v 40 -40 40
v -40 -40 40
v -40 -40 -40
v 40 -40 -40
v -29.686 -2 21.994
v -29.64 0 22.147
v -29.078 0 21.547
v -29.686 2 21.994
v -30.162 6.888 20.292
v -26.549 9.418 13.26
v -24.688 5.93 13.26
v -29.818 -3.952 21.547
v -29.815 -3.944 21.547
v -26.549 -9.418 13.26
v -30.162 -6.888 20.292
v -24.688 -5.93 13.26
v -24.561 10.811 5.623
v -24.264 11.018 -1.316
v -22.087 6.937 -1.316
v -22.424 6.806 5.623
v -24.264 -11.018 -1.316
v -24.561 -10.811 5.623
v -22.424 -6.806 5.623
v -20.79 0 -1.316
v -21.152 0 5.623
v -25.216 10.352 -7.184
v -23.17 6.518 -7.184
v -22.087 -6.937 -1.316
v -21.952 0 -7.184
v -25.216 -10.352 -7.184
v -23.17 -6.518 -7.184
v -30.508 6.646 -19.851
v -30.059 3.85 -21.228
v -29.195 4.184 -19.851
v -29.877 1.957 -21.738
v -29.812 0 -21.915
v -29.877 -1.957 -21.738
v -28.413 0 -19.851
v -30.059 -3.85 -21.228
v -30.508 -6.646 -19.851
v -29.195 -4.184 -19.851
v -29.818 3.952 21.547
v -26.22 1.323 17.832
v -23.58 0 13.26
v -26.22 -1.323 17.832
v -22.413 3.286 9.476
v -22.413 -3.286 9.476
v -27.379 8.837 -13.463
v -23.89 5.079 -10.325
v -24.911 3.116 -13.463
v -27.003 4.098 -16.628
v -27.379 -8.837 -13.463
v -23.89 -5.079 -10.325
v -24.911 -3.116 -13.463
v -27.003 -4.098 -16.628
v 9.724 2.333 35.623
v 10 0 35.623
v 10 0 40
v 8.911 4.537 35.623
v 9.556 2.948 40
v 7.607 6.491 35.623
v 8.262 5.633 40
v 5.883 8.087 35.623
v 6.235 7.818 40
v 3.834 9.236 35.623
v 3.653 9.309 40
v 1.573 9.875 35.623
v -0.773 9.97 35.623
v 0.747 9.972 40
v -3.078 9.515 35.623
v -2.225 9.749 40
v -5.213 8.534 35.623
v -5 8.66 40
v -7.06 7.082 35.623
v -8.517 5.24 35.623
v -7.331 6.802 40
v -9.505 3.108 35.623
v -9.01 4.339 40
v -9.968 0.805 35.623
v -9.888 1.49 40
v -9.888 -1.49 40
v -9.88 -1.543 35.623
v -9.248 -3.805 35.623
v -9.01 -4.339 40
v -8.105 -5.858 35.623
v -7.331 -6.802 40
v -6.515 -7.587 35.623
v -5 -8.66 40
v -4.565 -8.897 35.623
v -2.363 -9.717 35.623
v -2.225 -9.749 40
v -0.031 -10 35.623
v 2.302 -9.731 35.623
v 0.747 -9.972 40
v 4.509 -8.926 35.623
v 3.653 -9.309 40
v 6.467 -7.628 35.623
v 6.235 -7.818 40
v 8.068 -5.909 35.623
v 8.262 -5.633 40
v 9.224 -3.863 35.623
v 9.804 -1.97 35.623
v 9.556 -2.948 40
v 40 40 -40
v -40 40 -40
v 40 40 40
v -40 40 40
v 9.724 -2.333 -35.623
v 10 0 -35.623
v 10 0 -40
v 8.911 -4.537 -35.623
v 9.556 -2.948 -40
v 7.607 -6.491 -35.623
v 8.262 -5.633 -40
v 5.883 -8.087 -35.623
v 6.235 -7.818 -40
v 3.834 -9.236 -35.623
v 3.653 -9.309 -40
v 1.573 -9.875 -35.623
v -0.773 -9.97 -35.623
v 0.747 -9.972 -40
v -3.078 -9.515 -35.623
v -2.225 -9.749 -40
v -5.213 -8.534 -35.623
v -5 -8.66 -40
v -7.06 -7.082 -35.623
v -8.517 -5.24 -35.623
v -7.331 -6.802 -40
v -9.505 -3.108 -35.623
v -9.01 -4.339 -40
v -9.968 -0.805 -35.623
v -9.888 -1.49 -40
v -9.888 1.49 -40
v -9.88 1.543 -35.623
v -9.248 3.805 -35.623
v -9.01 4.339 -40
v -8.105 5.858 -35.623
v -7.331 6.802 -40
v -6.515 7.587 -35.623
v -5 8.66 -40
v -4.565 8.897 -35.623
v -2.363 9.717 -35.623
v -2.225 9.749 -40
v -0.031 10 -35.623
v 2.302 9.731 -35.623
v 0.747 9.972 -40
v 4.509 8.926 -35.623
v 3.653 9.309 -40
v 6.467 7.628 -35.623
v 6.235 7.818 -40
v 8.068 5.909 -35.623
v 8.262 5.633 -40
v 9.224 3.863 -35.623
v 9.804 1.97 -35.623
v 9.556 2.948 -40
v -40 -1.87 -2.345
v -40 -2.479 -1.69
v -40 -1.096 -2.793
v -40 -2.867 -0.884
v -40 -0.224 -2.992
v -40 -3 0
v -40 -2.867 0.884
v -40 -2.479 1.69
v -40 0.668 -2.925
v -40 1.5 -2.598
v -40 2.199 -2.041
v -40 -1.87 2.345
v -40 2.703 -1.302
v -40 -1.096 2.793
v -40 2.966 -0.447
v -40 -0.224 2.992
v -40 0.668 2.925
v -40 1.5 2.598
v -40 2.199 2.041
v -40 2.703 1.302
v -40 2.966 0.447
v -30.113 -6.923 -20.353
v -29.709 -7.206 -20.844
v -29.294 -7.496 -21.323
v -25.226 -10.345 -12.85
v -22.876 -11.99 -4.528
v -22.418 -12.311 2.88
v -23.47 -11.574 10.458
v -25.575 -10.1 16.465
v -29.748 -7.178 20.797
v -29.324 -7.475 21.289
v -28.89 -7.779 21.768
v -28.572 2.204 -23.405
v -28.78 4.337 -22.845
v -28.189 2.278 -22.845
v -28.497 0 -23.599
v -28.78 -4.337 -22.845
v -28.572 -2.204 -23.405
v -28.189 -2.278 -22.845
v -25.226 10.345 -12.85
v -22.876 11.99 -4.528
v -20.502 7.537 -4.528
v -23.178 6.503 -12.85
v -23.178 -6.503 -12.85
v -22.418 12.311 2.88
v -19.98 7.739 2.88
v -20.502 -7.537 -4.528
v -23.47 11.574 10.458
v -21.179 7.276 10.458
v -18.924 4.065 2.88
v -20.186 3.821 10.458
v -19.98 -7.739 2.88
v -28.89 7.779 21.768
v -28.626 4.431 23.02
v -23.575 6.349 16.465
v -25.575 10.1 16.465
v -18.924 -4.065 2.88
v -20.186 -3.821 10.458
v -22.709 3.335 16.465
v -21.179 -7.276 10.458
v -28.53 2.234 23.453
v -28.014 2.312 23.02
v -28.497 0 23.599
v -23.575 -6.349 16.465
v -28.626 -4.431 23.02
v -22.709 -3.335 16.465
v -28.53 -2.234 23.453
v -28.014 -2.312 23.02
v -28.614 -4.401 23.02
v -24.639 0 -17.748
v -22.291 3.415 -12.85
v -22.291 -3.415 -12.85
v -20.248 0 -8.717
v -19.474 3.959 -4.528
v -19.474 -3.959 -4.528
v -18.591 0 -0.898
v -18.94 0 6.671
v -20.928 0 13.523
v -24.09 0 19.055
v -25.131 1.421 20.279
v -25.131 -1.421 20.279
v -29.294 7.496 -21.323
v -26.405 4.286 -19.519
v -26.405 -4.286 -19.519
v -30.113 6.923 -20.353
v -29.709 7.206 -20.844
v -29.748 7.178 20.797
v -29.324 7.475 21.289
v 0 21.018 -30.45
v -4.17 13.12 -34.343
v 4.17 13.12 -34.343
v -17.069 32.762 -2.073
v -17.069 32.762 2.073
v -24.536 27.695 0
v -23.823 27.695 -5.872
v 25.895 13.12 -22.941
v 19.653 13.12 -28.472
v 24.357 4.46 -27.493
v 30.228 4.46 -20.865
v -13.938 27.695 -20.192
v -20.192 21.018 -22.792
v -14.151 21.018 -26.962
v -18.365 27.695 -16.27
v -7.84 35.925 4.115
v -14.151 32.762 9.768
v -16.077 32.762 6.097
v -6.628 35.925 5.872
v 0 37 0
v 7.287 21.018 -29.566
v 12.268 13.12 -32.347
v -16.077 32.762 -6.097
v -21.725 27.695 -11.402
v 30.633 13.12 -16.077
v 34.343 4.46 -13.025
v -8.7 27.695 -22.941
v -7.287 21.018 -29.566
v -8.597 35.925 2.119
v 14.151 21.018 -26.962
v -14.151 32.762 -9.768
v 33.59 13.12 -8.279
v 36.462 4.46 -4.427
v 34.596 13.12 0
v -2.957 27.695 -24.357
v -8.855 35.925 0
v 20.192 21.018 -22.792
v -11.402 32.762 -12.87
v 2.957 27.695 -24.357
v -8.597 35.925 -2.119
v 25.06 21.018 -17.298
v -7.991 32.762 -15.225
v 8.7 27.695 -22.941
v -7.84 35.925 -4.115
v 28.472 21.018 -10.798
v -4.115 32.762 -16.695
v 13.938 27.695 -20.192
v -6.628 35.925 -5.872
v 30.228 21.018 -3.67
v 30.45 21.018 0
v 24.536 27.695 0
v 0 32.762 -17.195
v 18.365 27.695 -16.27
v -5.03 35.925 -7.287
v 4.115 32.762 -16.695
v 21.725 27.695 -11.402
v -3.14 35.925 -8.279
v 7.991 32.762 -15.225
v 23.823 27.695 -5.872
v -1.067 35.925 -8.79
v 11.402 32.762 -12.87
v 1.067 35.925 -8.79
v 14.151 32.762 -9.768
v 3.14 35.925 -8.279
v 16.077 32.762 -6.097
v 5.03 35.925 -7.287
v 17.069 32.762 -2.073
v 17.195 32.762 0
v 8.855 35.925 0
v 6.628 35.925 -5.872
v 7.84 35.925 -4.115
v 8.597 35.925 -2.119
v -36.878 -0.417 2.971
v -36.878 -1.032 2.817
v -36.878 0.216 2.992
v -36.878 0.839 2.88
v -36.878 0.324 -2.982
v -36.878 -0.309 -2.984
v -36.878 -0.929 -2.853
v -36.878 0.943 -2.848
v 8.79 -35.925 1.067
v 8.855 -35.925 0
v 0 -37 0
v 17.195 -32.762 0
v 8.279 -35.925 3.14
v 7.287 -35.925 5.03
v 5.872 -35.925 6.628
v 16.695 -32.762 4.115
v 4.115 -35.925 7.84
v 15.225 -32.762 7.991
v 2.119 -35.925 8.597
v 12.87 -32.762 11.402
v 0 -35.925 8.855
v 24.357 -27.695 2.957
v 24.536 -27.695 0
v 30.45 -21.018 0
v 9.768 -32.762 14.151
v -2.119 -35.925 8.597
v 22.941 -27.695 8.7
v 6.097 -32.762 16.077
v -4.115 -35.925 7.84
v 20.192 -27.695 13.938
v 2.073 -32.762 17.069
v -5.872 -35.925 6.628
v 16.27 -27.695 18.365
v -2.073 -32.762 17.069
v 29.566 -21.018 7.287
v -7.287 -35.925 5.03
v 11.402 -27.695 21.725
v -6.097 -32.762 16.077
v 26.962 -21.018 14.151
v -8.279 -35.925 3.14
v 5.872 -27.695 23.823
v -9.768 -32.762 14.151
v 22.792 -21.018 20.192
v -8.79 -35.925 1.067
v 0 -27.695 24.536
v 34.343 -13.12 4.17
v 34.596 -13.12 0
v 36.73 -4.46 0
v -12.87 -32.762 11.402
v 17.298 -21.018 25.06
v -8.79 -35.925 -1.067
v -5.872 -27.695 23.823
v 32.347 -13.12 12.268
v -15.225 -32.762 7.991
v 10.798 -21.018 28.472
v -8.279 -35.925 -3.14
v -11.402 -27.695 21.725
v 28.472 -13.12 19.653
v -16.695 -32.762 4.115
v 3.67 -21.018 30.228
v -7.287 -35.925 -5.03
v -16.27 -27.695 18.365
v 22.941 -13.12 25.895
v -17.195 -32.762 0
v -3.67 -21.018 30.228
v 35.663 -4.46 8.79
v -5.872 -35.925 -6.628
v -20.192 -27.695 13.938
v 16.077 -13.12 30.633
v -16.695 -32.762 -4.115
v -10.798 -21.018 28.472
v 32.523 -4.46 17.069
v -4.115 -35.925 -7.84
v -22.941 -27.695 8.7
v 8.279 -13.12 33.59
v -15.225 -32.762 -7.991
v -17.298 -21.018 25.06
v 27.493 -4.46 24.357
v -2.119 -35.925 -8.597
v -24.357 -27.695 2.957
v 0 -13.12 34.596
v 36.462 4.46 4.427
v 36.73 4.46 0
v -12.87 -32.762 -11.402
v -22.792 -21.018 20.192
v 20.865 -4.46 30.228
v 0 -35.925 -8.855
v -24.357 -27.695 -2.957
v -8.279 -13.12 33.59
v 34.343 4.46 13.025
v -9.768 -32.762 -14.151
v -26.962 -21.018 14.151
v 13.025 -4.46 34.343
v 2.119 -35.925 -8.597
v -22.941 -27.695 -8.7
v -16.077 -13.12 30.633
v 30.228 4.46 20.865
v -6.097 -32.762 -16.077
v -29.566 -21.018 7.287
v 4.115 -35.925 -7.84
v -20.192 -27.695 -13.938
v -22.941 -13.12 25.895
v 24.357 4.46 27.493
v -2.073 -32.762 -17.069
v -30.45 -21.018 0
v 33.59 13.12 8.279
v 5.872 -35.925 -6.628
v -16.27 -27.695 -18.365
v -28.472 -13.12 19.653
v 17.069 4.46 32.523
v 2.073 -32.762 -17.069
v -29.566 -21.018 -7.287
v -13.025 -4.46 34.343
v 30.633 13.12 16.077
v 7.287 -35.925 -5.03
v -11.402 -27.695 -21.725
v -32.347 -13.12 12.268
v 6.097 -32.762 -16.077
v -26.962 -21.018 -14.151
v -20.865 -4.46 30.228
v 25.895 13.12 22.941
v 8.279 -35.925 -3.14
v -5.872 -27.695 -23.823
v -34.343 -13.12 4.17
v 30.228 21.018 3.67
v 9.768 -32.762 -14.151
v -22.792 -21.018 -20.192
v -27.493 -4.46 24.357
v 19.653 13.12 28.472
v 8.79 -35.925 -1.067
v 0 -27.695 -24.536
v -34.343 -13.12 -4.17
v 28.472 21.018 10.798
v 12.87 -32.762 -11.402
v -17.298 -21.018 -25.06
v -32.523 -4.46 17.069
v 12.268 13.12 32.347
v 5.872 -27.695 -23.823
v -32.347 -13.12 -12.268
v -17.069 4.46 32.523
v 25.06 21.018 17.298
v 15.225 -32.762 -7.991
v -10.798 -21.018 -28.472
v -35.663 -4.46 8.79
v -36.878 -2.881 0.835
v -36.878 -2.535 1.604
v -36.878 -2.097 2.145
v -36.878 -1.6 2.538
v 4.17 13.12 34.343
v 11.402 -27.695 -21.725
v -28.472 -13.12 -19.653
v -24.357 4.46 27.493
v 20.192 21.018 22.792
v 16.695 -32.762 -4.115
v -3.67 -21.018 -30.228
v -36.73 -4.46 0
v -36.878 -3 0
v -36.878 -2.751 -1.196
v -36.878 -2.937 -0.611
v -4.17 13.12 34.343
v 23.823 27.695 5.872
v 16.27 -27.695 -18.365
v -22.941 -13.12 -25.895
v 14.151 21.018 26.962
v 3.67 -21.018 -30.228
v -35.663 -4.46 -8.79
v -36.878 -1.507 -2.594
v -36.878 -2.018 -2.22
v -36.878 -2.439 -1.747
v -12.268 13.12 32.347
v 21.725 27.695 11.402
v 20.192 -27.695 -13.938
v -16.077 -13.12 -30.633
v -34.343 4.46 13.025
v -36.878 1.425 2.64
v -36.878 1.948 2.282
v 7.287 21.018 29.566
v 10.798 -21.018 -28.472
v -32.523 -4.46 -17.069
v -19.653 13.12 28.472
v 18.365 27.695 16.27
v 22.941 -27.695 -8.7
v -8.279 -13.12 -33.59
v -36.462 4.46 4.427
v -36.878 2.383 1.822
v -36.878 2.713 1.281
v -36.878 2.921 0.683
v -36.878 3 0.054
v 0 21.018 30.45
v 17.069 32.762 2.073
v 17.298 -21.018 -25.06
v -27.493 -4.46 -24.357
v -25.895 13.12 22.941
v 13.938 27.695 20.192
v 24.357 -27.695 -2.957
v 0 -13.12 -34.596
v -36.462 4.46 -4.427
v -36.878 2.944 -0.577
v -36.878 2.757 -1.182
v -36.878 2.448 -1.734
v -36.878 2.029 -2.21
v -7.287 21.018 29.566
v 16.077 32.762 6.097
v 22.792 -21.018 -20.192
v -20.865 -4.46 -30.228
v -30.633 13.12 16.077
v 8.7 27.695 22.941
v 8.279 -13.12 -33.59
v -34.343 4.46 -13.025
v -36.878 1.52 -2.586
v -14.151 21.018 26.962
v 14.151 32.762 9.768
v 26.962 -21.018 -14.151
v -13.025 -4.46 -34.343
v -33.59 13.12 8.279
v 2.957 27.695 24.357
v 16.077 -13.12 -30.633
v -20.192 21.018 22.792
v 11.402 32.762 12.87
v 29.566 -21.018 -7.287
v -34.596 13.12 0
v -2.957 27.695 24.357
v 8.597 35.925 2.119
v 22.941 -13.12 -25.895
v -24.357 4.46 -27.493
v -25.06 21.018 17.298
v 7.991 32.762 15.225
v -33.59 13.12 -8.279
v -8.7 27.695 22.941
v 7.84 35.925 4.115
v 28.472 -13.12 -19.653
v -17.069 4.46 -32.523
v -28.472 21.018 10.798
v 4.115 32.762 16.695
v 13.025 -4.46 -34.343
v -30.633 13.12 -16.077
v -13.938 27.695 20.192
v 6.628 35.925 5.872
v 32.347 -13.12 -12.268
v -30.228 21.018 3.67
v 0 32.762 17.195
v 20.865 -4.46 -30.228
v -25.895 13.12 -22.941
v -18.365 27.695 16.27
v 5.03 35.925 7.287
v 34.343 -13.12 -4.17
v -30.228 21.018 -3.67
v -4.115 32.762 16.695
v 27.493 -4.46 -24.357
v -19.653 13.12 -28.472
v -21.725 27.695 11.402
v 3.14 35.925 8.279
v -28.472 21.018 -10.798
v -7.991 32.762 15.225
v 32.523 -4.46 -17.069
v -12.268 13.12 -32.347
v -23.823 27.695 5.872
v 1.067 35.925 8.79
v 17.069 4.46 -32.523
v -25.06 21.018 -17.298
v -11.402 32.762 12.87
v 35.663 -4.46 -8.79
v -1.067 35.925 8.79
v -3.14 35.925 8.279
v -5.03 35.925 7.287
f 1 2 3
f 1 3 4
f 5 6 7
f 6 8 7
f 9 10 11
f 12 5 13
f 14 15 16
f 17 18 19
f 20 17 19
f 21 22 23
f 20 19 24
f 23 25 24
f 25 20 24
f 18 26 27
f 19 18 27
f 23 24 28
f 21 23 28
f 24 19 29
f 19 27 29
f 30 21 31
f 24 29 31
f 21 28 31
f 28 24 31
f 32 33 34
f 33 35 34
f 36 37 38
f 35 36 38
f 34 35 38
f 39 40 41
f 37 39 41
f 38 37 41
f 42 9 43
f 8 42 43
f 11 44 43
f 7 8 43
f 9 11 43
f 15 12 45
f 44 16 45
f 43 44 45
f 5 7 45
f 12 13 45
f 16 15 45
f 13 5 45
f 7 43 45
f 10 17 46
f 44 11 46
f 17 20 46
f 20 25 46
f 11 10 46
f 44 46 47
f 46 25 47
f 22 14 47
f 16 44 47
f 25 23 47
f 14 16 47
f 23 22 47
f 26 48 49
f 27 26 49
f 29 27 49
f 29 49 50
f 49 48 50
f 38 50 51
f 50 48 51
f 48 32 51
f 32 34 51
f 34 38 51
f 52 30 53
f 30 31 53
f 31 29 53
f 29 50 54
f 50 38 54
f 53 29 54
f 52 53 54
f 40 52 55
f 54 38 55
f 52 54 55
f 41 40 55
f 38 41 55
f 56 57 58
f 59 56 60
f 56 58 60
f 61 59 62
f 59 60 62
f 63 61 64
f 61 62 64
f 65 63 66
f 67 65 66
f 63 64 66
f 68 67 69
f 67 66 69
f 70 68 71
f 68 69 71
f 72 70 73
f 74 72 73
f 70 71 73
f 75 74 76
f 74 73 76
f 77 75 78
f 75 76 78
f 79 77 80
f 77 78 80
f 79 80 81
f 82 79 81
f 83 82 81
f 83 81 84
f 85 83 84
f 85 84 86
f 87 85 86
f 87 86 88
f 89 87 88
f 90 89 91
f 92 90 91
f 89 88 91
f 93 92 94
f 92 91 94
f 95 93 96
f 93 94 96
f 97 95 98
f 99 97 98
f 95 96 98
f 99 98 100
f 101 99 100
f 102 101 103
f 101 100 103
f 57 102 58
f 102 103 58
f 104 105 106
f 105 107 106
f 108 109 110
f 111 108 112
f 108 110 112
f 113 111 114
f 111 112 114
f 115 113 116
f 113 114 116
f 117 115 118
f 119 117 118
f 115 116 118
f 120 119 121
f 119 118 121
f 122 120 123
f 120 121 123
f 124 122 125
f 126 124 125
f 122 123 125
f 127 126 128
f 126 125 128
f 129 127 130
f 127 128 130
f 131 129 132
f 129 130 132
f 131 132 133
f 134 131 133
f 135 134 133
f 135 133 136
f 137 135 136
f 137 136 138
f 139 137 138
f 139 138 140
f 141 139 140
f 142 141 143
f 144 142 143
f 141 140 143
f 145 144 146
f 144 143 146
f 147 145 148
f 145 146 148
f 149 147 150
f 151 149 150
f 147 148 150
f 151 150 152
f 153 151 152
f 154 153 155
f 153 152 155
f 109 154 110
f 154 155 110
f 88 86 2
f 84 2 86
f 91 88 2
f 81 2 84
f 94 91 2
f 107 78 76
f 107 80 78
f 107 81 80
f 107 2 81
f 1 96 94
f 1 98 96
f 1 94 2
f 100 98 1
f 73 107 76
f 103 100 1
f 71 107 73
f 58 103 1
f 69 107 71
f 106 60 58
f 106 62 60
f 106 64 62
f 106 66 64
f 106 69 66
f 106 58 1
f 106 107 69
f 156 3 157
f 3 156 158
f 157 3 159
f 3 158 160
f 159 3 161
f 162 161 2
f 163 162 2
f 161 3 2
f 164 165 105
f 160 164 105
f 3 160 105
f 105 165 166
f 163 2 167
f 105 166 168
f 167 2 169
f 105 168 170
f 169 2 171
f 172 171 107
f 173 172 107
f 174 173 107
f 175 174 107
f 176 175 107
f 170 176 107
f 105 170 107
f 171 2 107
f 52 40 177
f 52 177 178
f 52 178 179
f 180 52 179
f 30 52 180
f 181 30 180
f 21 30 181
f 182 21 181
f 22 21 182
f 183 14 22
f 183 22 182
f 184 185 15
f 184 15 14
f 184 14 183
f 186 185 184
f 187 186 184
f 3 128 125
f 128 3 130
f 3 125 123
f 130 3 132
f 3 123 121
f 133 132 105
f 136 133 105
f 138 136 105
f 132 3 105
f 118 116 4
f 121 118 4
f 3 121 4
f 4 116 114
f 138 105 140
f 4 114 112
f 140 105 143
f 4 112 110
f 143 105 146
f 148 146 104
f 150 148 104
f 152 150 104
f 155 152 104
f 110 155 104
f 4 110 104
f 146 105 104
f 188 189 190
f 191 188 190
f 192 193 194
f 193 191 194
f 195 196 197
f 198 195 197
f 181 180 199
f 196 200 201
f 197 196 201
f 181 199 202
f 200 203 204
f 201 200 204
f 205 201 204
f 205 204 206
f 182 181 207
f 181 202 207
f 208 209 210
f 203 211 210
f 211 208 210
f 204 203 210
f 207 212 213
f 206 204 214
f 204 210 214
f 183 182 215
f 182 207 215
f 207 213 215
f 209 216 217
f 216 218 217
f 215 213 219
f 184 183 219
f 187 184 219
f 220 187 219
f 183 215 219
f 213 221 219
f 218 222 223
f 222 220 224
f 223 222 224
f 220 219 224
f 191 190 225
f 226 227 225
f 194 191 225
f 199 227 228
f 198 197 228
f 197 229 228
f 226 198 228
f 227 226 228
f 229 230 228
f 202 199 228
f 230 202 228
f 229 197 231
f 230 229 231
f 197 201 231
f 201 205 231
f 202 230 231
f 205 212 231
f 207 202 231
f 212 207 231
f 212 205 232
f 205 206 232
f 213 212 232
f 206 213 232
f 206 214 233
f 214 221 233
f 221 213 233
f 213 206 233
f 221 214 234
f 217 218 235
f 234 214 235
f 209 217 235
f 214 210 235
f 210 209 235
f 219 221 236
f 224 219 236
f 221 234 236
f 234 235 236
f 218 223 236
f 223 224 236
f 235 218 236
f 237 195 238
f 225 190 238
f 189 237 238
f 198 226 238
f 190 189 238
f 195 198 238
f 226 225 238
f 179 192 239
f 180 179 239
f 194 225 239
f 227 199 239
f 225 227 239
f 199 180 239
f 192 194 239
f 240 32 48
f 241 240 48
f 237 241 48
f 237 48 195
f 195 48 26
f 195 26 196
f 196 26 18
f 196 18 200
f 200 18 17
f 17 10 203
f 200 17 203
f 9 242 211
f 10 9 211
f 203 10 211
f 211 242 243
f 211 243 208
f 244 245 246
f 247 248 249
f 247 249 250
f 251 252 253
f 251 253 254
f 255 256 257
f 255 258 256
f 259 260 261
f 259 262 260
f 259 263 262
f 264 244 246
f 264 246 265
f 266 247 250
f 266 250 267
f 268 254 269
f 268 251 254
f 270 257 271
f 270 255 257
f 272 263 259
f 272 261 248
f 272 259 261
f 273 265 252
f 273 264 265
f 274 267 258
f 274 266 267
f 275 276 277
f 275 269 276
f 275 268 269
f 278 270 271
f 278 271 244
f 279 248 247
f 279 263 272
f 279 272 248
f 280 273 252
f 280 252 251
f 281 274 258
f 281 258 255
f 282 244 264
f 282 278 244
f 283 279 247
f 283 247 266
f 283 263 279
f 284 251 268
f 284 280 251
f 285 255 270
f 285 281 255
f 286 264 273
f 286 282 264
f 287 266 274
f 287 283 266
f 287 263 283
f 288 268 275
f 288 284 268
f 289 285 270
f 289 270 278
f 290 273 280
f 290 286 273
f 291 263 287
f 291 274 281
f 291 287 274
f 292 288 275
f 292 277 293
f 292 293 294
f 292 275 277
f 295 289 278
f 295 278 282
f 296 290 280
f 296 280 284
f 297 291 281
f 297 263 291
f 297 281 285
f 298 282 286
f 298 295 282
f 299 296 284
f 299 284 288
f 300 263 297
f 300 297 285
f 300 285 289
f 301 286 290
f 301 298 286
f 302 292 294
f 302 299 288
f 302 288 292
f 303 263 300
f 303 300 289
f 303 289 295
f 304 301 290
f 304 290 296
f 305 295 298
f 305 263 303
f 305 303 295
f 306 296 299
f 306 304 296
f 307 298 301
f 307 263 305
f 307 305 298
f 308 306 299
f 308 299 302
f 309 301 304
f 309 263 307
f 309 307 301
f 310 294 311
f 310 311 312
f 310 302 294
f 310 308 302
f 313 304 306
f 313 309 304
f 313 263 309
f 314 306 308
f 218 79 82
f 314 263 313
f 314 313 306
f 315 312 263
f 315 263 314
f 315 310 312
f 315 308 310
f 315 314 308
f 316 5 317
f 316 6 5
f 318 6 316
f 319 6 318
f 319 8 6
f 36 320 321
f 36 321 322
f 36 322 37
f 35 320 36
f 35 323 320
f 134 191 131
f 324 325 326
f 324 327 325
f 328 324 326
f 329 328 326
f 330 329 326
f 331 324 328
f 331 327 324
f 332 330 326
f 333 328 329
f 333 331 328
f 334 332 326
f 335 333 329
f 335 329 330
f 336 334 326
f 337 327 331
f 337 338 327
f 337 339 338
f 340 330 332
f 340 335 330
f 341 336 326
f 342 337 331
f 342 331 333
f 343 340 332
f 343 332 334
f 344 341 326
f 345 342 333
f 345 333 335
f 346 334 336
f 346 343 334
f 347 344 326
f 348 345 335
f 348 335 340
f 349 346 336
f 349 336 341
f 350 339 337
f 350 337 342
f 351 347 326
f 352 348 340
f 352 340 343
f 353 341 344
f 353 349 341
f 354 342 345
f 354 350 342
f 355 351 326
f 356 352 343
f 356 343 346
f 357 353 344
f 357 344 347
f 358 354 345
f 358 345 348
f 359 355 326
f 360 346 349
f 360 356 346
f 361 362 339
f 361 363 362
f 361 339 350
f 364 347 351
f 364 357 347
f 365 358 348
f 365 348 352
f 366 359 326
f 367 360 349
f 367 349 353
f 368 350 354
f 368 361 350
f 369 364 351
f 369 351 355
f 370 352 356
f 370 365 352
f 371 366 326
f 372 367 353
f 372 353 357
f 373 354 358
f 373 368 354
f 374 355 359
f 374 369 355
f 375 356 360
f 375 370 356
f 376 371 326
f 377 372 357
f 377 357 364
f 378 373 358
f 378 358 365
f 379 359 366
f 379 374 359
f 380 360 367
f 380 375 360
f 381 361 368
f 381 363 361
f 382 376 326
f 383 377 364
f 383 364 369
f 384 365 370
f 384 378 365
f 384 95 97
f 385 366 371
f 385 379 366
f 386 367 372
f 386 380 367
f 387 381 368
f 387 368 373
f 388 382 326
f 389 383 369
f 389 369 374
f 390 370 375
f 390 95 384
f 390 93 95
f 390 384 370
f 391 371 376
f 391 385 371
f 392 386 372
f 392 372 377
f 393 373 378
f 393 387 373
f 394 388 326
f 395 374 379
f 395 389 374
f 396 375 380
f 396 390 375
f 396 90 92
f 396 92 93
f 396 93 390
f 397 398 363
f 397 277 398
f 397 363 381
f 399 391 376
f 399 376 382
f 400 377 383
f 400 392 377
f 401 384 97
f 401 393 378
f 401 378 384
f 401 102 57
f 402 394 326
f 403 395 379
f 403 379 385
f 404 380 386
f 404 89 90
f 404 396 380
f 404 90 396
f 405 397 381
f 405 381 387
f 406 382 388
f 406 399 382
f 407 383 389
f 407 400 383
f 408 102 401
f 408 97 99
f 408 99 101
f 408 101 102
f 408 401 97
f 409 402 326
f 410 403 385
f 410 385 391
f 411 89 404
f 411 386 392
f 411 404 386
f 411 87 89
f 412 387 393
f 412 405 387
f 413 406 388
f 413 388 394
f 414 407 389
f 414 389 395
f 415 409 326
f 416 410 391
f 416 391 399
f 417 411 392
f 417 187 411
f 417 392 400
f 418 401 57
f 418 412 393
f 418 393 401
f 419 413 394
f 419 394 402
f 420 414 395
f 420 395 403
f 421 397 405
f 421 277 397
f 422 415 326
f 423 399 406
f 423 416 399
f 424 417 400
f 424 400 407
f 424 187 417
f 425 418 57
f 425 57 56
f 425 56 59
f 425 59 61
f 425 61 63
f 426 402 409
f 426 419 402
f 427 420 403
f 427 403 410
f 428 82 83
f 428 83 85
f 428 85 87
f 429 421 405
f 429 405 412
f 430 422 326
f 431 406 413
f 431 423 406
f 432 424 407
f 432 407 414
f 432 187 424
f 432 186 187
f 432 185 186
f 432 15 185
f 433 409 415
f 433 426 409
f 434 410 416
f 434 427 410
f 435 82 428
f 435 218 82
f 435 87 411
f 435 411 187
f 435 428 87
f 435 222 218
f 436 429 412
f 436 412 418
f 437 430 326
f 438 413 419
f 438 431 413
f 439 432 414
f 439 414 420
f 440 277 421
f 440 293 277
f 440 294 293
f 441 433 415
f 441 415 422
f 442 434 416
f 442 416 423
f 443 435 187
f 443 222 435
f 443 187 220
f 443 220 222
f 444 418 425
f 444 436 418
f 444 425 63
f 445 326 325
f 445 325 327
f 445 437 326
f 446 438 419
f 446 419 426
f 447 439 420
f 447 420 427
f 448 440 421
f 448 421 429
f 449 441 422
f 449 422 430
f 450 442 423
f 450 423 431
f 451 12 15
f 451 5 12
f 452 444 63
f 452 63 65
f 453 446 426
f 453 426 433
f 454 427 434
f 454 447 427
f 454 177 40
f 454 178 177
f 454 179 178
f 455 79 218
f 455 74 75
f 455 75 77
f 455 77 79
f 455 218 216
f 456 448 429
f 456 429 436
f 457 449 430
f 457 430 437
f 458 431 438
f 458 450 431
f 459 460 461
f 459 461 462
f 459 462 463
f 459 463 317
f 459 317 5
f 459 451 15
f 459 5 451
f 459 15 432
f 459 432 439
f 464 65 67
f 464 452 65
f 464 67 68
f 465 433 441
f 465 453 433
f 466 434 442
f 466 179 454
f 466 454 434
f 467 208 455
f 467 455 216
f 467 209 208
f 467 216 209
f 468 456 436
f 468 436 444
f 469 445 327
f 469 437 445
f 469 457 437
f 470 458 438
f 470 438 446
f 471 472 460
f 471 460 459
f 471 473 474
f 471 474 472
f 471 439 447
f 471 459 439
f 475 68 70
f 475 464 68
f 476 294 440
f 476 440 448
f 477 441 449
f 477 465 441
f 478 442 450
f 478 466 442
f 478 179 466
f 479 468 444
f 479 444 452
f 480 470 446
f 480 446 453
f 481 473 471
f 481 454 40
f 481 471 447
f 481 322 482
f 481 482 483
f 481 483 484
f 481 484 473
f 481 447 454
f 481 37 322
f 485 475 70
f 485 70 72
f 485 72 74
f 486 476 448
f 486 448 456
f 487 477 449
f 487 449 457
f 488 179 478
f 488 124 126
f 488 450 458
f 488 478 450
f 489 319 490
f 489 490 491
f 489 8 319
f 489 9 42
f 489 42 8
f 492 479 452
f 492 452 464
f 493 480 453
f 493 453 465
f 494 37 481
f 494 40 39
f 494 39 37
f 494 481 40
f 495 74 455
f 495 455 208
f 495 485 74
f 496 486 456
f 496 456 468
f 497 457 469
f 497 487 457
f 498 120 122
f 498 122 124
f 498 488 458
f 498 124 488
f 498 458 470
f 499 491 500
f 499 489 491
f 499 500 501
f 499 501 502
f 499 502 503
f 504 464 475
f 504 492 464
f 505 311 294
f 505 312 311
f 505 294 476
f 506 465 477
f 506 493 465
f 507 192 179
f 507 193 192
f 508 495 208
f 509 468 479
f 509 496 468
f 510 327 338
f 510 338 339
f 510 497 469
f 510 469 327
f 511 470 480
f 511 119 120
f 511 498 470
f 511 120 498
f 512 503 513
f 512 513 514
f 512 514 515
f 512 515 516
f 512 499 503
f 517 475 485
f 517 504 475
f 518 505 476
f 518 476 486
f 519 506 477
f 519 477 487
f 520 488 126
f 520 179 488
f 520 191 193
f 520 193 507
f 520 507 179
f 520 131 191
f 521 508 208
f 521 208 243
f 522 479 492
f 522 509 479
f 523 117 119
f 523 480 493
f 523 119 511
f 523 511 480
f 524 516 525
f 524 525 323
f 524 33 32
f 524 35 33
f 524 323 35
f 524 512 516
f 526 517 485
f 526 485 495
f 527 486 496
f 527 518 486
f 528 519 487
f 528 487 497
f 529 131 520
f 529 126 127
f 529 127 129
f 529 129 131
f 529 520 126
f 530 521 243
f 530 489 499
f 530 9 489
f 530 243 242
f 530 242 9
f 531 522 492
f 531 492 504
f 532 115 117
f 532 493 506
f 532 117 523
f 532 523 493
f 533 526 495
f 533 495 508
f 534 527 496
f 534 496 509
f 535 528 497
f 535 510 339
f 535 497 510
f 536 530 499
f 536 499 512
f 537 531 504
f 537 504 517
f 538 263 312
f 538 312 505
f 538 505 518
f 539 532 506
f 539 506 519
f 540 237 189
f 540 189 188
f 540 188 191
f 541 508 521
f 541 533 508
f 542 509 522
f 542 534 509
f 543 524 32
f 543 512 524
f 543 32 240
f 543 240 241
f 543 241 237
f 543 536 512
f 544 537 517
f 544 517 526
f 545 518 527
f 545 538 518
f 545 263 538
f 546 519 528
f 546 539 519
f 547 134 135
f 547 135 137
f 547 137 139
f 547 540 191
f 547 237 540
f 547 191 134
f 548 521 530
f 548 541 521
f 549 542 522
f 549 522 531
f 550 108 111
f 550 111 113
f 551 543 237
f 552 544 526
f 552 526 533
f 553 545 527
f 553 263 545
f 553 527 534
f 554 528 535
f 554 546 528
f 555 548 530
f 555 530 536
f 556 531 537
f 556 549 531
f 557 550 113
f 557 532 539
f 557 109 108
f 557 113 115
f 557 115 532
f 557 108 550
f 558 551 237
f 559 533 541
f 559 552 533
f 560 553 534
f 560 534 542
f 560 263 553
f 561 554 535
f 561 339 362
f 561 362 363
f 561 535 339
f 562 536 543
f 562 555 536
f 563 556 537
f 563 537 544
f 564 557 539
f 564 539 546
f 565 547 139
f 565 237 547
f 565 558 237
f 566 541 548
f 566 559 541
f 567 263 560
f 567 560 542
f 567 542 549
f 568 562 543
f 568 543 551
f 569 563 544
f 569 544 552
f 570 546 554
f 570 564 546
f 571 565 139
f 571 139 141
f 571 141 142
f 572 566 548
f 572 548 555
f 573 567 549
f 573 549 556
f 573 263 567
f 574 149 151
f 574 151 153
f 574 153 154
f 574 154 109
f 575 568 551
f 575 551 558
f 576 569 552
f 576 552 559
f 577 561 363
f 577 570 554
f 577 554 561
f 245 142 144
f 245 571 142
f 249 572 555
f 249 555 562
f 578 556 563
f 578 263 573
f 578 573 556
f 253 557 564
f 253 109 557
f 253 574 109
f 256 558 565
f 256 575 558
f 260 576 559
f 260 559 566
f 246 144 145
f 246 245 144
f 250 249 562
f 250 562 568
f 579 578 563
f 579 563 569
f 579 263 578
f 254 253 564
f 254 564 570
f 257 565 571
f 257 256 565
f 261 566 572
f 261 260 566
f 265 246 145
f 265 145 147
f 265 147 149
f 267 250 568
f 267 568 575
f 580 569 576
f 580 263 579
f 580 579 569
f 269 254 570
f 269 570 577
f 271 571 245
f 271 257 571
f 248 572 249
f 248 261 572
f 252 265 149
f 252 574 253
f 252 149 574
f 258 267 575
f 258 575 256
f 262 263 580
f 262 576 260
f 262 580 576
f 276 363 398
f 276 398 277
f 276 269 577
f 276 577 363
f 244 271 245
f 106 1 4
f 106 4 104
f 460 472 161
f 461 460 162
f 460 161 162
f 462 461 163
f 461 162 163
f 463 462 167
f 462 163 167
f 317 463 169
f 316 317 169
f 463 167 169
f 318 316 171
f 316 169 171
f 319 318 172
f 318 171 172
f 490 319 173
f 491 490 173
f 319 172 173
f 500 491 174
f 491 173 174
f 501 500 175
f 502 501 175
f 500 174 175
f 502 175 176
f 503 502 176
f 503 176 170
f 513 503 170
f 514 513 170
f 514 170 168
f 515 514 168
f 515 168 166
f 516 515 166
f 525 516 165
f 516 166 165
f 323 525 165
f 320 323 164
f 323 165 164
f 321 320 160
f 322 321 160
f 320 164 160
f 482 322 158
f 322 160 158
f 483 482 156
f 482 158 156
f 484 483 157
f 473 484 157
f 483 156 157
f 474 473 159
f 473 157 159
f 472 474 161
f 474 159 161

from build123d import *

# Parameters (mm, degrees)
F2_W          = 80
F2_H          = 80
F3_DEPTH      = 40
F7_ANGLE_BACK = 35
F7_ANGLE      = 70
F8_R          = 3
F9_DEPTH      = 4
F10_R         = 10
F11_DEPTH     = 5
F12_R         = 10
F13_DEPTH     = 5


# Not quite as in the source:
# - a feature names something its author has since deleted; it is built from what else it names


with BuildPart() as f1:
    # F0 (on Top) → F1 (revolve)
    with BuildSketch(Plane.XY):
        with BuildLine():
            Line((0, 37), (0, -37))
            ThreePointArc((0, -37), (37, 0), (0, 37))
        make_face()
    revolve(axis=Axis((0, 0, 0), (0, -1, 0)))


with BuildPart() as f3:
    # F2 (on Top) → F3 (new body, symmetric)
    with BuildSketch(Plane.XY):
        Rectangle(F2_W, F2_H)
    extrude(amount=F3_DEPTH, both=True)

    # F4: cut F1
    add(f1.part, mode=Mode.SUBTRACT)

    # F6 (on Front) → F7 (revolve)
    with BuildSketch(Plane.XZ, mode=Mode.PRIVATE) as f7_sk:
        with BuildLine():
            add(Edge.make_bspline(
                [(-28.4972605327, -23.5988589159), (-22.613415631, -15.226576282), (-15.2284997687, -1.2521191935), (-21.0733372873, 17.730814669), (-28.4972605327, 23.5988589159)],
                knots=[0, 0, 0, 0, 0.5, 1, 1, 1, 1], degree=3))
            ThreePointArc((-28.4972605327, 23.5988589159), (-29.0776083413, 22.8799626999), (-29.6398253299, 22.1468000942))
            add(Edge.make_bspline(
                [(-29.6398253299, 22.1468000942), (-23.6962903291, 15.970768407), (-17.3082405815, -0.7806496907), (-24.5547182858, -14.3142519519), (-29.8117857382, -21.9147765469)],
                knots=[0, 0, 0, 0, 0.5007860737, 1, 1, 1, 1], degree=3))
            ThreePointArc((-29.8117857382, -21.9147765469), (-29.1666805209, -22.7663072849), (-28.4972605327, -23.5988589159))
        make_face()
    revolve(f7_sk.sketch.rotate(Axis((-40, 0, 0), (0, 0, -1)), -F7_ANGLE_BACK), axis=Axis((-40, 0, 0), (0, 0, -1)), revolution_arc=F7_ANGLE)

    # F8 (on face) → F9 (cut, symmetric)
    with BuildSketch(Plane(origin=(-40, 0, 0), x_dir=(0, -1, 0), z_dir=(-1, 0, 0))):
        Circle(F8_R)
    extrude(amount=F9_DEPTH, both=True, mode=Mode.SUBTRACT)

    # F10 (on face) → F11 (cut, symmetric)
    with BuildSketch(Plane.XY.offset(40)):
        Circle(F10_R)
    extrude(amount=F11_DEPTH, both=True, mode=Mode.SUBTRACT)

    # F12 (on face) → F13 (cut, symmetric)
    with BuildSketch(Plane(origin=(0, 0, -40), x_dir=(1, 0, 0), z_dir=(0, 0, -1))):
        Circle(F12_R)
    extrude(amount=F13_DEPTH, both=True, mode=Mode.SUBTRACT)


solid = f3.part
